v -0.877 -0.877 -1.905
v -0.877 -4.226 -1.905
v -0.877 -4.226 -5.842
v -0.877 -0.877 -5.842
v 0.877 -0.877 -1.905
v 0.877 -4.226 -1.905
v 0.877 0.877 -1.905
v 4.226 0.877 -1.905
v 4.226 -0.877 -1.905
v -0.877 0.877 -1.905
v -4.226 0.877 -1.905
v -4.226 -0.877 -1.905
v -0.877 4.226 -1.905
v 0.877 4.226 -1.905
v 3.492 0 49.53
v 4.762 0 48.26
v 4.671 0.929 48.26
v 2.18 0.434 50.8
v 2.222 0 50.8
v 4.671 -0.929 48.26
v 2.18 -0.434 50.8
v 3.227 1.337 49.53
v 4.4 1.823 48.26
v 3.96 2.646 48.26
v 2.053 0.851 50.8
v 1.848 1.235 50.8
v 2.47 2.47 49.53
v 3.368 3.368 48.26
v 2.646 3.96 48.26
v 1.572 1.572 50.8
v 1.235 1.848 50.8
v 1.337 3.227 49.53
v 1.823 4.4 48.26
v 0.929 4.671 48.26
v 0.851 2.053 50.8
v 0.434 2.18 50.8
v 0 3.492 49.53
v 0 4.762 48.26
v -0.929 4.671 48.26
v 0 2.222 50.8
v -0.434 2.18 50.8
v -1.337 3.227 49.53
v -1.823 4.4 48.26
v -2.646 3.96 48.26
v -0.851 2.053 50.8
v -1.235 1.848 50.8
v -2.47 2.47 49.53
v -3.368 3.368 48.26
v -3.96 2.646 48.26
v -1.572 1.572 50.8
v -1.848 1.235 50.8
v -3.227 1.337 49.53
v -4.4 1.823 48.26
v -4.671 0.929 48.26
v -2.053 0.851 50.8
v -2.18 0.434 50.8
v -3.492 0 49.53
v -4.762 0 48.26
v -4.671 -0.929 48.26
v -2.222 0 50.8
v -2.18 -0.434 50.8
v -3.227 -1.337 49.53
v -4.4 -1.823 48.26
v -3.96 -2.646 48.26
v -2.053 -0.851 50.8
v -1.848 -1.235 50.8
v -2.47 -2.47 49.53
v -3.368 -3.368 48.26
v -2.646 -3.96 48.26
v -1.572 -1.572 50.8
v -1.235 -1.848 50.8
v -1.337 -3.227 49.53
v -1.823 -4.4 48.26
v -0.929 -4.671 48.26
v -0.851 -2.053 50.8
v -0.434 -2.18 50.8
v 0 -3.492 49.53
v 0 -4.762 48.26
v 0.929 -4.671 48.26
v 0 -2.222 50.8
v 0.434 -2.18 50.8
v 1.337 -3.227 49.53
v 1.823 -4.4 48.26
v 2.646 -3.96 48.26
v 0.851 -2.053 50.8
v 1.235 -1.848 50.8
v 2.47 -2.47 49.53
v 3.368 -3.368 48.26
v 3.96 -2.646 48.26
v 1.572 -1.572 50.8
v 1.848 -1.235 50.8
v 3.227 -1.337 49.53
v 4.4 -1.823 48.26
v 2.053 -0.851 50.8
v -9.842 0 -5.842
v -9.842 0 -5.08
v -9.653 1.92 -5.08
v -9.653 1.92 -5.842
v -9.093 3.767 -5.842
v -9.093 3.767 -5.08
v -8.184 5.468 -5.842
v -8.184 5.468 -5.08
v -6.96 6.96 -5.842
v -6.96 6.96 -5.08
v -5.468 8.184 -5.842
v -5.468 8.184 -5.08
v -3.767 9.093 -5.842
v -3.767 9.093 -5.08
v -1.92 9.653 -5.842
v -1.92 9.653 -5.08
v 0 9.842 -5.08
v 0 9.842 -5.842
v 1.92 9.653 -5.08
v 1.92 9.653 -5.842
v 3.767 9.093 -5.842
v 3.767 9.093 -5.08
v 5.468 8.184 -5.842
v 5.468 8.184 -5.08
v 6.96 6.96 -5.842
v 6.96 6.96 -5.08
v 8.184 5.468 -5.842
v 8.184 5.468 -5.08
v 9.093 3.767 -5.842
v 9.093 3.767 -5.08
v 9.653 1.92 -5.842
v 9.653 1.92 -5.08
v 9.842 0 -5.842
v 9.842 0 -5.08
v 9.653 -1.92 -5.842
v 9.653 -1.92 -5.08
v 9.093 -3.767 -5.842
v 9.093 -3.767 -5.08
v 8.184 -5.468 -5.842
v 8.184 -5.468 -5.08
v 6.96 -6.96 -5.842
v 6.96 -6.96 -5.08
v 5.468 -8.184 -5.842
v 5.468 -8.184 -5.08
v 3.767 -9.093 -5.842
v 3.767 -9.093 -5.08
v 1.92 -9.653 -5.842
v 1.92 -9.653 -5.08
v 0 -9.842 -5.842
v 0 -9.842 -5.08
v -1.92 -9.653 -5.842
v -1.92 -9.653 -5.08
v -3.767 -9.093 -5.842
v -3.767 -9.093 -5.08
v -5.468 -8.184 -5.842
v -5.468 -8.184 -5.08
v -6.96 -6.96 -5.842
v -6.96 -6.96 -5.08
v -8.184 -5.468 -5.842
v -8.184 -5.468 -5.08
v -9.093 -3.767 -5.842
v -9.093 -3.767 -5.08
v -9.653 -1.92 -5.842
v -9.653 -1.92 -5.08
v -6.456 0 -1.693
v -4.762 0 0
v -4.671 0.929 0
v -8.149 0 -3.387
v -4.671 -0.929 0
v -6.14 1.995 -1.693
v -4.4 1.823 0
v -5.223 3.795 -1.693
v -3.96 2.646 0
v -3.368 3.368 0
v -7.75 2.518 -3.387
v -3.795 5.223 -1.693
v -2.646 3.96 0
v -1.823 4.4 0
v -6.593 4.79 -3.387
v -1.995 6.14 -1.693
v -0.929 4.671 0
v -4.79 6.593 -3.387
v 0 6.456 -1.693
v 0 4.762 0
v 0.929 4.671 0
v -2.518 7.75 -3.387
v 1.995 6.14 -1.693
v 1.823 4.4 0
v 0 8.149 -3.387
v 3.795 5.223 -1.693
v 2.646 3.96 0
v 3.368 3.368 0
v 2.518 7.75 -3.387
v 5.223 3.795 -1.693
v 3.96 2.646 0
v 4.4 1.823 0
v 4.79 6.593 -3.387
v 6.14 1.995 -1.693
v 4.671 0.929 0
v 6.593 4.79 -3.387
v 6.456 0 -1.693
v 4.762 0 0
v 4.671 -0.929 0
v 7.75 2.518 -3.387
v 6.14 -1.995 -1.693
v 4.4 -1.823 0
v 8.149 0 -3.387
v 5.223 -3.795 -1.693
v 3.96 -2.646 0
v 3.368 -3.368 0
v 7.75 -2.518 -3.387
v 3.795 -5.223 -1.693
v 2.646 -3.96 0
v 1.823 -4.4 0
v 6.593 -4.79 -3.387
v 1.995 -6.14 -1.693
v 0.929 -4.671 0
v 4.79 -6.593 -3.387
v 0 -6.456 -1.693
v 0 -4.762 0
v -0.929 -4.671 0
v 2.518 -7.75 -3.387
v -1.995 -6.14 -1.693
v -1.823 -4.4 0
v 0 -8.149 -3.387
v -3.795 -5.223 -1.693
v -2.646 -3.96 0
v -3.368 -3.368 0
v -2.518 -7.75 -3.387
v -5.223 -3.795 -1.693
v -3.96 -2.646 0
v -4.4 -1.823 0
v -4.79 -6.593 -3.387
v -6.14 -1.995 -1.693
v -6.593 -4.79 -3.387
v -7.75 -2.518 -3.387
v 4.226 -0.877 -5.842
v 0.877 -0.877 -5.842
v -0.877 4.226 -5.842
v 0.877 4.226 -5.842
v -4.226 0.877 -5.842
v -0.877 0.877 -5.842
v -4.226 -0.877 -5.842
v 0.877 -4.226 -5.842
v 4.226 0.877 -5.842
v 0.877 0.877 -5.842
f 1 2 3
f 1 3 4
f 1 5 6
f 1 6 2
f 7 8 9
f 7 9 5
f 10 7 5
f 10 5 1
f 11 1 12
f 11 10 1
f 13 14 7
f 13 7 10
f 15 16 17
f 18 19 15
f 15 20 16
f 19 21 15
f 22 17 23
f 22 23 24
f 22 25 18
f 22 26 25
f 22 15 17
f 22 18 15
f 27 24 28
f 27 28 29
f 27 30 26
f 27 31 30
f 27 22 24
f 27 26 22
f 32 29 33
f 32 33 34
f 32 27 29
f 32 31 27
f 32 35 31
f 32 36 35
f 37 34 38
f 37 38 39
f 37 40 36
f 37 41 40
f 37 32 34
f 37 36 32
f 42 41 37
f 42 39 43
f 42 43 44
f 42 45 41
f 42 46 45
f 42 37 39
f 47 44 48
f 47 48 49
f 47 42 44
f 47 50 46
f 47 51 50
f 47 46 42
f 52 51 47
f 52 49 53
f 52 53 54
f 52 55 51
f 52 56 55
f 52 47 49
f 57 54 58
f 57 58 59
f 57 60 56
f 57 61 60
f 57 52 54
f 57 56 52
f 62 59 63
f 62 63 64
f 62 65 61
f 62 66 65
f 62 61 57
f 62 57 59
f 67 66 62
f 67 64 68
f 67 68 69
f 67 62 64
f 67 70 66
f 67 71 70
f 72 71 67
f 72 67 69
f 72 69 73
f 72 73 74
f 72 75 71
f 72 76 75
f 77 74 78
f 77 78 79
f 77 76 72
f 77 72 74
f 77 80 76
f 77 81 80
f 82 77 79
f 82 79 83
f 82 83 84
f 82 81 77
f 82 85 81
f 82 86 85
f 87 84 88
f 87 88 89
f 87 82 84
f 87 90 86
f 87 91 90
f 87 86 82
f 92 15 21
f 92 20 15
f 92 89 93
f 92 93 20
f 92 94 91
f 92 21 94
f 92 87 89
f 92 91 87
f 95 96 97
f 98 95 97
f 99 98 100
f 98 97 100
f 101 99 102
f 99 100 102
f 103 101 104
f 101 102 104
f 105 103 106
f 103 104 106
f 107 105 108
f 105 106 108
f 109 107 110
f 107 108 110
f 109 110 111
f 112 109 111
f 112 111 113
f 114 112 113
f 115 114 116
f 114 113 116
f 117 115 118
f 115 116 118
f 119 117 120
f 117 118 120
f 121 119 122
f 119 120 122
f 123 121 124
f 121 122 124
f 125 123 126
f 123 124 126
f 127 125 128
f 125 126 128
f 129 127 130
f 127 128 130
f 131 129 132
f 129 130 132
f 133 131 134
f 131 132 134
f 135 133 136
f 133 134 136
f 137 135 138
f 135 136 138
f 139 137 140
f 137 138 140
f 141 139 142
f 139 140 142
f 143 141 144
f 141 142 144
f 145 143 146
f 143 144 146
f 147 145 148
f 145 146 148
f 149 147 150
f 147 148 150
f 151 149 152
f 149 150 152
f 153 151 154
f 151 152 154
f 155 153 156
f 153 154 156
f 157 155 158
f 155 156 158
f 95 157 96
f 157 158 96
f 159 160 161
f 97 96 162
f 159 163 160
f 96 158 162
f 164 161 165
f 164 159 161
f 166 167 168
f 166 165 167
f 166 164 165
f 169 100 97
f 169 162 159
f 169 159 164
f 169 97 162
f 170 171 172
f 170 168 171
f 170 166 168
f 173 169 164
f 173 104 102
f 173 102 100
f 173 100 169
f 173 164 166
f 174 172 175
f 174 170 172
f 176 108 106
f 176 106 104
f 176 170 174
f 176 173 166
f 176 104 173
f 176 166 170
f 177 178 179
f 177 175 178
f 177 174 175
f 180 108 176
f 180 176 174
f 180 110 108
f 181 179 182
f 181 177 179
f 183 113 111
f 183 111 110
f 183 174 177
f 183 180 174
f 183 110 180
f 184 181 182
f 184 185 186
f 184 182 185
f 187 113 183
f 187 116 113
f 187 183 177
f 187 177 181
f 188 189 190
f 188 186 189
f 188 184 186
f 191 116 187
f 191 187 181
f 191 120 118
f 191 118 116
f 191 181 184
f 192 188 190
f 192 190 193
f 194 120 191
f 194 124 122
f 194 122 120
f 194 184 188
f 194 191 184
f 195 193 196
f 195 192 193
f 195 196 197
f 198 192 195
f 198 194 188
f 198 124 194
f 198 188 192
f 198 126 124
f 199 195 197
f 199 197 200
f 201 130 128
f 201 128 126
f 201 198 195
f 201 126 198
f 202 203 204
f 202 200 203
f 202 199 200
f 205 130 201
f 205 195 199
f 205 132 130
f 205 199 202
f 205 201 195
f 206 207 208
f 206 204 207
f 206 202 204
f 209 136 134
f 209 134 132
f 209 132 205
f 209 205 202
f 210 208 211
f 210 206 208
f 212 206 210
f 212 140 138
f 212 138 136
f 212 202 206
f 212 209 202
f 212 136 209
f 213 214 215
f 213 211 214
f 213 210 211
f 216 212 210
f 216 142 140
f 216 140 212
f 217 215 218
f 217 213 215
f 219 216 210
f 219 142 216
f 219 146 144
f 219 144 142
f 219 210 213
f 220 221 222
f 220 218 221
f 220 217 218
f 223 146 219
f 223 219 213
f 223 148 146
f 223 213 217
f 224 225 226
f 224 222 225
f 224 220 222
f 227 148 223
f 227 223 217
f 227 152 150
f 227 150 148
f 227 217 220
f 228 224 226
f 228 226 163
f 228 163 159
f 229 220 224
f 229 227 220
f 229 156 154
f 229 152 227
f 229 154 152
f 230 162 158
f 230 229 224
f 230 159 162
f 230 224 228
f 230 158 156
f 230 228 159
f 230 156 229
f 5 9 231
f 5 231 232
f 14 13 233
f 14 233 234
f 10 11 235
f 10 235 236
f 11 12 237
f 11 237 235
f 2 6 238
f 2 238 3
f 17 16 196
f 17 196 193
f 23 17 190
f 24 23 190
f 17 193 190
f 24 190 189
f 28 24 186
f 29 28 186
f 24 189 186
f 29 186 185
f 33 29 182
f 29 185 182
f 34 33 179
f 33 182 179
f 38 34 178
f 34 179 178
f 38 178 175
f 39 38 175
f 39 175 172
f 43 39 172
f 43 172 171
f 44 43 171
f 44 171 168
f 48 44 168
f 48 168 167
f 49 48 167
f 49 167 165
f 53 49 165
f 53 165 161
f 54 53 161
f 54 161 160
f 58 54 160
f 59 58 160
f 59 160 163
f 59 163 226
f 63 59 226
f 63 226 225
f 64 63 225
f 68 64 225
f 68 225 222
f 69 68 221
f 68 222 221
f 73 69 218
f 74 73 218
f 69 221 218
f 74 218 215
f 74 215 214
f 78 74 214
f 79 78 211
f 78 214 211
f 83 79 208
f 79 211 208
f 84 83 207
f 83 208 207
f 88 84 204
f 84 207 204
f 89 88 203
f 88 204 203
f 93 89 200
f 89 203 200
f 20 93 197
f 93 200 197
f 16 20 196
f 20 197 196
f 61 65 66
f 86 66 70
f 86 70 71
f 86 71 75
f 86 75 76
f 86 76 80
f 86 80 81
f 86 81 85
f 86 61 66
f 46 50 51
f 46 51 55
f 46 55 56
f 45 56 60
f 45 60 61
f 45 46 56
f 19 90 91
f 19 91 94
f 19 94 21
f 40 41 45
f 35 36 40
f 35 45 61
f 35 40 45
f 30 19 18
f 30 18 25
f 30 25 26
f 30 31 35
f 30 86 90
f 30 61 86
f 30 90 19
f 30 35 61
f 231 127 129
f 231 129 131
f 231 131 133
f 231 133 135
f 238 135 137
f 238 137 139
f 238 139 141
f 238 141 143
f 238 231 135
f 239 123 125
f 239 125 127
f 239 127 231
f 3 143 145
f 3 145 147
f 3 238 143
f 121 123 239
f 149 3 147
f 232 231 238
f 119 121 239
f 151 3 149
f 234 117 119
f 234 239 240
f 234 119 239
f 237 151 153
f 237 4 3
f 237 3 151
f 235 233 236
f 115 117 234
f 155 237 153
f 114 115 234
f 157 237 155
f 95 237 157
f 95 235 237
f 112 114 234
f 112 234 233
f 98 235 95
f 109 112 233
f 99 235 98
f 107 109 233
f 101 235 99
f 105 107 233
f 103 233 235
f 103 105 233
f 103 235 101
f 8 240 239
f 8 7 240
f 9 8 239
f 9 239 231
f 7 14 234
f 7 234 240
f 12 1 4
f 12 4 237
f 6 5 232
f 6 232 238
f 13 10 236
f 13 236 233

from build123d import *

# Parameters (mm, degrees)
SKETCH1_R           = 4.7625
BASE_EXTRUDE_DEPTH  = 50.8
SKETCH2_R           = 4.7625
BOSS_EXTRUDE1_DEPTH = 5.08
BOSS_EXTRUDE1_TAPER = -45
SKETCH3_W           = 1.754126852
SKETCH3_H           = 4.225851054
CUT_EXTRUDE1_DEPTH  = 3.175
CIRPATTERN1_COUNT   = 4
SKETCH4_R           = 9.8425
BOSS_EXTRUDE2_DEPTH = 0.762
CHAMFER1_SIZE       = 2.54


with BuildPart() as part:
    # Sketch1 → Base-Extrude (new body)
    with BuildSketch(Plane.XY):
        Circle(SKETCH1_R)
    extrude(amount=BASE_EXTRUDE_DEPTH)

    # Sketch2 → Boss-Extrude1 (add)
    with BuildSketch(Plane(origin=(0, 0, 0), x_dir=(-1, 0, 0), z_dir=(0, 0, -1))):
        Circle(SKETCH2_R)
    extrude(amount=BOSS_EXTRUDE1_DEPTH, taper=BOSS_EXTRUDE1_TAPER)

    # Sketch3 → Cut-Extrude1 (cut)
    with BuildSketch(Plane(origin=(0, 0, -5.08), x_dir=(-1, 0, 0), z_dir=(0, 0, -1))):
        with Locations((0, 2.112925527)):
            Rectangle(SKETCH3_W, SKETCH3_H)
    cut_extrude1 = extrude(amount=-CUT_EXTRUDE1_DEPTH, mode=Mode.SUBTRACT)

    # CirPattern1: Cut-Extrude1 ×4 about axis
    cirpattern1_axis = Axis((0, 0, 0), (0, 0, -1))
    for i in range(1, CIRPATTERN1_COUNT):
        add(cut_extrude1.rotate(cirpattern1_axis, i * 360 / CIRPATTERN1_COUNT), mode=Mode.SUBTRACT)

    # Sketch4 → Boss-Extrude2 (add)
    with BuildSketch(Plane(origin=(0, 0, -5.08), x_dir=(-1, 0, 0), z_dir=(0, 0, -1))):
        Circle(SKETCH4_R)
        Polygon((-0.877063426, 0.877063426), (-4.225851054, 0.877063426), (-4.225851054, -0.877063426), (-0.877063426, -0.877063426), (-0.877063426, -4.225851054), (0.877063426, -4.225851054), (0.877063426, -0.877063426), (4.225851054, -0.877063426), (4.225851054, 0.877063426), (0.877063426, 0.877063426), (0.877063426, 4.225851054), (-0.877063426, 4.225851054), align=None, mode=Mode.SUBTRACT)
    extrude(amount=BOSS_EXTRUDE2_DEPTH)

    # Chamfer1
    chamfer1_edges = [part.edges().sort_by_distance(p)[0] for p in [
        (-4.7625, 0, 50.8),
    ]]
    chamfer(chamfer1_edges, length=CHAMFER1_SIZE)


solid = part.part
